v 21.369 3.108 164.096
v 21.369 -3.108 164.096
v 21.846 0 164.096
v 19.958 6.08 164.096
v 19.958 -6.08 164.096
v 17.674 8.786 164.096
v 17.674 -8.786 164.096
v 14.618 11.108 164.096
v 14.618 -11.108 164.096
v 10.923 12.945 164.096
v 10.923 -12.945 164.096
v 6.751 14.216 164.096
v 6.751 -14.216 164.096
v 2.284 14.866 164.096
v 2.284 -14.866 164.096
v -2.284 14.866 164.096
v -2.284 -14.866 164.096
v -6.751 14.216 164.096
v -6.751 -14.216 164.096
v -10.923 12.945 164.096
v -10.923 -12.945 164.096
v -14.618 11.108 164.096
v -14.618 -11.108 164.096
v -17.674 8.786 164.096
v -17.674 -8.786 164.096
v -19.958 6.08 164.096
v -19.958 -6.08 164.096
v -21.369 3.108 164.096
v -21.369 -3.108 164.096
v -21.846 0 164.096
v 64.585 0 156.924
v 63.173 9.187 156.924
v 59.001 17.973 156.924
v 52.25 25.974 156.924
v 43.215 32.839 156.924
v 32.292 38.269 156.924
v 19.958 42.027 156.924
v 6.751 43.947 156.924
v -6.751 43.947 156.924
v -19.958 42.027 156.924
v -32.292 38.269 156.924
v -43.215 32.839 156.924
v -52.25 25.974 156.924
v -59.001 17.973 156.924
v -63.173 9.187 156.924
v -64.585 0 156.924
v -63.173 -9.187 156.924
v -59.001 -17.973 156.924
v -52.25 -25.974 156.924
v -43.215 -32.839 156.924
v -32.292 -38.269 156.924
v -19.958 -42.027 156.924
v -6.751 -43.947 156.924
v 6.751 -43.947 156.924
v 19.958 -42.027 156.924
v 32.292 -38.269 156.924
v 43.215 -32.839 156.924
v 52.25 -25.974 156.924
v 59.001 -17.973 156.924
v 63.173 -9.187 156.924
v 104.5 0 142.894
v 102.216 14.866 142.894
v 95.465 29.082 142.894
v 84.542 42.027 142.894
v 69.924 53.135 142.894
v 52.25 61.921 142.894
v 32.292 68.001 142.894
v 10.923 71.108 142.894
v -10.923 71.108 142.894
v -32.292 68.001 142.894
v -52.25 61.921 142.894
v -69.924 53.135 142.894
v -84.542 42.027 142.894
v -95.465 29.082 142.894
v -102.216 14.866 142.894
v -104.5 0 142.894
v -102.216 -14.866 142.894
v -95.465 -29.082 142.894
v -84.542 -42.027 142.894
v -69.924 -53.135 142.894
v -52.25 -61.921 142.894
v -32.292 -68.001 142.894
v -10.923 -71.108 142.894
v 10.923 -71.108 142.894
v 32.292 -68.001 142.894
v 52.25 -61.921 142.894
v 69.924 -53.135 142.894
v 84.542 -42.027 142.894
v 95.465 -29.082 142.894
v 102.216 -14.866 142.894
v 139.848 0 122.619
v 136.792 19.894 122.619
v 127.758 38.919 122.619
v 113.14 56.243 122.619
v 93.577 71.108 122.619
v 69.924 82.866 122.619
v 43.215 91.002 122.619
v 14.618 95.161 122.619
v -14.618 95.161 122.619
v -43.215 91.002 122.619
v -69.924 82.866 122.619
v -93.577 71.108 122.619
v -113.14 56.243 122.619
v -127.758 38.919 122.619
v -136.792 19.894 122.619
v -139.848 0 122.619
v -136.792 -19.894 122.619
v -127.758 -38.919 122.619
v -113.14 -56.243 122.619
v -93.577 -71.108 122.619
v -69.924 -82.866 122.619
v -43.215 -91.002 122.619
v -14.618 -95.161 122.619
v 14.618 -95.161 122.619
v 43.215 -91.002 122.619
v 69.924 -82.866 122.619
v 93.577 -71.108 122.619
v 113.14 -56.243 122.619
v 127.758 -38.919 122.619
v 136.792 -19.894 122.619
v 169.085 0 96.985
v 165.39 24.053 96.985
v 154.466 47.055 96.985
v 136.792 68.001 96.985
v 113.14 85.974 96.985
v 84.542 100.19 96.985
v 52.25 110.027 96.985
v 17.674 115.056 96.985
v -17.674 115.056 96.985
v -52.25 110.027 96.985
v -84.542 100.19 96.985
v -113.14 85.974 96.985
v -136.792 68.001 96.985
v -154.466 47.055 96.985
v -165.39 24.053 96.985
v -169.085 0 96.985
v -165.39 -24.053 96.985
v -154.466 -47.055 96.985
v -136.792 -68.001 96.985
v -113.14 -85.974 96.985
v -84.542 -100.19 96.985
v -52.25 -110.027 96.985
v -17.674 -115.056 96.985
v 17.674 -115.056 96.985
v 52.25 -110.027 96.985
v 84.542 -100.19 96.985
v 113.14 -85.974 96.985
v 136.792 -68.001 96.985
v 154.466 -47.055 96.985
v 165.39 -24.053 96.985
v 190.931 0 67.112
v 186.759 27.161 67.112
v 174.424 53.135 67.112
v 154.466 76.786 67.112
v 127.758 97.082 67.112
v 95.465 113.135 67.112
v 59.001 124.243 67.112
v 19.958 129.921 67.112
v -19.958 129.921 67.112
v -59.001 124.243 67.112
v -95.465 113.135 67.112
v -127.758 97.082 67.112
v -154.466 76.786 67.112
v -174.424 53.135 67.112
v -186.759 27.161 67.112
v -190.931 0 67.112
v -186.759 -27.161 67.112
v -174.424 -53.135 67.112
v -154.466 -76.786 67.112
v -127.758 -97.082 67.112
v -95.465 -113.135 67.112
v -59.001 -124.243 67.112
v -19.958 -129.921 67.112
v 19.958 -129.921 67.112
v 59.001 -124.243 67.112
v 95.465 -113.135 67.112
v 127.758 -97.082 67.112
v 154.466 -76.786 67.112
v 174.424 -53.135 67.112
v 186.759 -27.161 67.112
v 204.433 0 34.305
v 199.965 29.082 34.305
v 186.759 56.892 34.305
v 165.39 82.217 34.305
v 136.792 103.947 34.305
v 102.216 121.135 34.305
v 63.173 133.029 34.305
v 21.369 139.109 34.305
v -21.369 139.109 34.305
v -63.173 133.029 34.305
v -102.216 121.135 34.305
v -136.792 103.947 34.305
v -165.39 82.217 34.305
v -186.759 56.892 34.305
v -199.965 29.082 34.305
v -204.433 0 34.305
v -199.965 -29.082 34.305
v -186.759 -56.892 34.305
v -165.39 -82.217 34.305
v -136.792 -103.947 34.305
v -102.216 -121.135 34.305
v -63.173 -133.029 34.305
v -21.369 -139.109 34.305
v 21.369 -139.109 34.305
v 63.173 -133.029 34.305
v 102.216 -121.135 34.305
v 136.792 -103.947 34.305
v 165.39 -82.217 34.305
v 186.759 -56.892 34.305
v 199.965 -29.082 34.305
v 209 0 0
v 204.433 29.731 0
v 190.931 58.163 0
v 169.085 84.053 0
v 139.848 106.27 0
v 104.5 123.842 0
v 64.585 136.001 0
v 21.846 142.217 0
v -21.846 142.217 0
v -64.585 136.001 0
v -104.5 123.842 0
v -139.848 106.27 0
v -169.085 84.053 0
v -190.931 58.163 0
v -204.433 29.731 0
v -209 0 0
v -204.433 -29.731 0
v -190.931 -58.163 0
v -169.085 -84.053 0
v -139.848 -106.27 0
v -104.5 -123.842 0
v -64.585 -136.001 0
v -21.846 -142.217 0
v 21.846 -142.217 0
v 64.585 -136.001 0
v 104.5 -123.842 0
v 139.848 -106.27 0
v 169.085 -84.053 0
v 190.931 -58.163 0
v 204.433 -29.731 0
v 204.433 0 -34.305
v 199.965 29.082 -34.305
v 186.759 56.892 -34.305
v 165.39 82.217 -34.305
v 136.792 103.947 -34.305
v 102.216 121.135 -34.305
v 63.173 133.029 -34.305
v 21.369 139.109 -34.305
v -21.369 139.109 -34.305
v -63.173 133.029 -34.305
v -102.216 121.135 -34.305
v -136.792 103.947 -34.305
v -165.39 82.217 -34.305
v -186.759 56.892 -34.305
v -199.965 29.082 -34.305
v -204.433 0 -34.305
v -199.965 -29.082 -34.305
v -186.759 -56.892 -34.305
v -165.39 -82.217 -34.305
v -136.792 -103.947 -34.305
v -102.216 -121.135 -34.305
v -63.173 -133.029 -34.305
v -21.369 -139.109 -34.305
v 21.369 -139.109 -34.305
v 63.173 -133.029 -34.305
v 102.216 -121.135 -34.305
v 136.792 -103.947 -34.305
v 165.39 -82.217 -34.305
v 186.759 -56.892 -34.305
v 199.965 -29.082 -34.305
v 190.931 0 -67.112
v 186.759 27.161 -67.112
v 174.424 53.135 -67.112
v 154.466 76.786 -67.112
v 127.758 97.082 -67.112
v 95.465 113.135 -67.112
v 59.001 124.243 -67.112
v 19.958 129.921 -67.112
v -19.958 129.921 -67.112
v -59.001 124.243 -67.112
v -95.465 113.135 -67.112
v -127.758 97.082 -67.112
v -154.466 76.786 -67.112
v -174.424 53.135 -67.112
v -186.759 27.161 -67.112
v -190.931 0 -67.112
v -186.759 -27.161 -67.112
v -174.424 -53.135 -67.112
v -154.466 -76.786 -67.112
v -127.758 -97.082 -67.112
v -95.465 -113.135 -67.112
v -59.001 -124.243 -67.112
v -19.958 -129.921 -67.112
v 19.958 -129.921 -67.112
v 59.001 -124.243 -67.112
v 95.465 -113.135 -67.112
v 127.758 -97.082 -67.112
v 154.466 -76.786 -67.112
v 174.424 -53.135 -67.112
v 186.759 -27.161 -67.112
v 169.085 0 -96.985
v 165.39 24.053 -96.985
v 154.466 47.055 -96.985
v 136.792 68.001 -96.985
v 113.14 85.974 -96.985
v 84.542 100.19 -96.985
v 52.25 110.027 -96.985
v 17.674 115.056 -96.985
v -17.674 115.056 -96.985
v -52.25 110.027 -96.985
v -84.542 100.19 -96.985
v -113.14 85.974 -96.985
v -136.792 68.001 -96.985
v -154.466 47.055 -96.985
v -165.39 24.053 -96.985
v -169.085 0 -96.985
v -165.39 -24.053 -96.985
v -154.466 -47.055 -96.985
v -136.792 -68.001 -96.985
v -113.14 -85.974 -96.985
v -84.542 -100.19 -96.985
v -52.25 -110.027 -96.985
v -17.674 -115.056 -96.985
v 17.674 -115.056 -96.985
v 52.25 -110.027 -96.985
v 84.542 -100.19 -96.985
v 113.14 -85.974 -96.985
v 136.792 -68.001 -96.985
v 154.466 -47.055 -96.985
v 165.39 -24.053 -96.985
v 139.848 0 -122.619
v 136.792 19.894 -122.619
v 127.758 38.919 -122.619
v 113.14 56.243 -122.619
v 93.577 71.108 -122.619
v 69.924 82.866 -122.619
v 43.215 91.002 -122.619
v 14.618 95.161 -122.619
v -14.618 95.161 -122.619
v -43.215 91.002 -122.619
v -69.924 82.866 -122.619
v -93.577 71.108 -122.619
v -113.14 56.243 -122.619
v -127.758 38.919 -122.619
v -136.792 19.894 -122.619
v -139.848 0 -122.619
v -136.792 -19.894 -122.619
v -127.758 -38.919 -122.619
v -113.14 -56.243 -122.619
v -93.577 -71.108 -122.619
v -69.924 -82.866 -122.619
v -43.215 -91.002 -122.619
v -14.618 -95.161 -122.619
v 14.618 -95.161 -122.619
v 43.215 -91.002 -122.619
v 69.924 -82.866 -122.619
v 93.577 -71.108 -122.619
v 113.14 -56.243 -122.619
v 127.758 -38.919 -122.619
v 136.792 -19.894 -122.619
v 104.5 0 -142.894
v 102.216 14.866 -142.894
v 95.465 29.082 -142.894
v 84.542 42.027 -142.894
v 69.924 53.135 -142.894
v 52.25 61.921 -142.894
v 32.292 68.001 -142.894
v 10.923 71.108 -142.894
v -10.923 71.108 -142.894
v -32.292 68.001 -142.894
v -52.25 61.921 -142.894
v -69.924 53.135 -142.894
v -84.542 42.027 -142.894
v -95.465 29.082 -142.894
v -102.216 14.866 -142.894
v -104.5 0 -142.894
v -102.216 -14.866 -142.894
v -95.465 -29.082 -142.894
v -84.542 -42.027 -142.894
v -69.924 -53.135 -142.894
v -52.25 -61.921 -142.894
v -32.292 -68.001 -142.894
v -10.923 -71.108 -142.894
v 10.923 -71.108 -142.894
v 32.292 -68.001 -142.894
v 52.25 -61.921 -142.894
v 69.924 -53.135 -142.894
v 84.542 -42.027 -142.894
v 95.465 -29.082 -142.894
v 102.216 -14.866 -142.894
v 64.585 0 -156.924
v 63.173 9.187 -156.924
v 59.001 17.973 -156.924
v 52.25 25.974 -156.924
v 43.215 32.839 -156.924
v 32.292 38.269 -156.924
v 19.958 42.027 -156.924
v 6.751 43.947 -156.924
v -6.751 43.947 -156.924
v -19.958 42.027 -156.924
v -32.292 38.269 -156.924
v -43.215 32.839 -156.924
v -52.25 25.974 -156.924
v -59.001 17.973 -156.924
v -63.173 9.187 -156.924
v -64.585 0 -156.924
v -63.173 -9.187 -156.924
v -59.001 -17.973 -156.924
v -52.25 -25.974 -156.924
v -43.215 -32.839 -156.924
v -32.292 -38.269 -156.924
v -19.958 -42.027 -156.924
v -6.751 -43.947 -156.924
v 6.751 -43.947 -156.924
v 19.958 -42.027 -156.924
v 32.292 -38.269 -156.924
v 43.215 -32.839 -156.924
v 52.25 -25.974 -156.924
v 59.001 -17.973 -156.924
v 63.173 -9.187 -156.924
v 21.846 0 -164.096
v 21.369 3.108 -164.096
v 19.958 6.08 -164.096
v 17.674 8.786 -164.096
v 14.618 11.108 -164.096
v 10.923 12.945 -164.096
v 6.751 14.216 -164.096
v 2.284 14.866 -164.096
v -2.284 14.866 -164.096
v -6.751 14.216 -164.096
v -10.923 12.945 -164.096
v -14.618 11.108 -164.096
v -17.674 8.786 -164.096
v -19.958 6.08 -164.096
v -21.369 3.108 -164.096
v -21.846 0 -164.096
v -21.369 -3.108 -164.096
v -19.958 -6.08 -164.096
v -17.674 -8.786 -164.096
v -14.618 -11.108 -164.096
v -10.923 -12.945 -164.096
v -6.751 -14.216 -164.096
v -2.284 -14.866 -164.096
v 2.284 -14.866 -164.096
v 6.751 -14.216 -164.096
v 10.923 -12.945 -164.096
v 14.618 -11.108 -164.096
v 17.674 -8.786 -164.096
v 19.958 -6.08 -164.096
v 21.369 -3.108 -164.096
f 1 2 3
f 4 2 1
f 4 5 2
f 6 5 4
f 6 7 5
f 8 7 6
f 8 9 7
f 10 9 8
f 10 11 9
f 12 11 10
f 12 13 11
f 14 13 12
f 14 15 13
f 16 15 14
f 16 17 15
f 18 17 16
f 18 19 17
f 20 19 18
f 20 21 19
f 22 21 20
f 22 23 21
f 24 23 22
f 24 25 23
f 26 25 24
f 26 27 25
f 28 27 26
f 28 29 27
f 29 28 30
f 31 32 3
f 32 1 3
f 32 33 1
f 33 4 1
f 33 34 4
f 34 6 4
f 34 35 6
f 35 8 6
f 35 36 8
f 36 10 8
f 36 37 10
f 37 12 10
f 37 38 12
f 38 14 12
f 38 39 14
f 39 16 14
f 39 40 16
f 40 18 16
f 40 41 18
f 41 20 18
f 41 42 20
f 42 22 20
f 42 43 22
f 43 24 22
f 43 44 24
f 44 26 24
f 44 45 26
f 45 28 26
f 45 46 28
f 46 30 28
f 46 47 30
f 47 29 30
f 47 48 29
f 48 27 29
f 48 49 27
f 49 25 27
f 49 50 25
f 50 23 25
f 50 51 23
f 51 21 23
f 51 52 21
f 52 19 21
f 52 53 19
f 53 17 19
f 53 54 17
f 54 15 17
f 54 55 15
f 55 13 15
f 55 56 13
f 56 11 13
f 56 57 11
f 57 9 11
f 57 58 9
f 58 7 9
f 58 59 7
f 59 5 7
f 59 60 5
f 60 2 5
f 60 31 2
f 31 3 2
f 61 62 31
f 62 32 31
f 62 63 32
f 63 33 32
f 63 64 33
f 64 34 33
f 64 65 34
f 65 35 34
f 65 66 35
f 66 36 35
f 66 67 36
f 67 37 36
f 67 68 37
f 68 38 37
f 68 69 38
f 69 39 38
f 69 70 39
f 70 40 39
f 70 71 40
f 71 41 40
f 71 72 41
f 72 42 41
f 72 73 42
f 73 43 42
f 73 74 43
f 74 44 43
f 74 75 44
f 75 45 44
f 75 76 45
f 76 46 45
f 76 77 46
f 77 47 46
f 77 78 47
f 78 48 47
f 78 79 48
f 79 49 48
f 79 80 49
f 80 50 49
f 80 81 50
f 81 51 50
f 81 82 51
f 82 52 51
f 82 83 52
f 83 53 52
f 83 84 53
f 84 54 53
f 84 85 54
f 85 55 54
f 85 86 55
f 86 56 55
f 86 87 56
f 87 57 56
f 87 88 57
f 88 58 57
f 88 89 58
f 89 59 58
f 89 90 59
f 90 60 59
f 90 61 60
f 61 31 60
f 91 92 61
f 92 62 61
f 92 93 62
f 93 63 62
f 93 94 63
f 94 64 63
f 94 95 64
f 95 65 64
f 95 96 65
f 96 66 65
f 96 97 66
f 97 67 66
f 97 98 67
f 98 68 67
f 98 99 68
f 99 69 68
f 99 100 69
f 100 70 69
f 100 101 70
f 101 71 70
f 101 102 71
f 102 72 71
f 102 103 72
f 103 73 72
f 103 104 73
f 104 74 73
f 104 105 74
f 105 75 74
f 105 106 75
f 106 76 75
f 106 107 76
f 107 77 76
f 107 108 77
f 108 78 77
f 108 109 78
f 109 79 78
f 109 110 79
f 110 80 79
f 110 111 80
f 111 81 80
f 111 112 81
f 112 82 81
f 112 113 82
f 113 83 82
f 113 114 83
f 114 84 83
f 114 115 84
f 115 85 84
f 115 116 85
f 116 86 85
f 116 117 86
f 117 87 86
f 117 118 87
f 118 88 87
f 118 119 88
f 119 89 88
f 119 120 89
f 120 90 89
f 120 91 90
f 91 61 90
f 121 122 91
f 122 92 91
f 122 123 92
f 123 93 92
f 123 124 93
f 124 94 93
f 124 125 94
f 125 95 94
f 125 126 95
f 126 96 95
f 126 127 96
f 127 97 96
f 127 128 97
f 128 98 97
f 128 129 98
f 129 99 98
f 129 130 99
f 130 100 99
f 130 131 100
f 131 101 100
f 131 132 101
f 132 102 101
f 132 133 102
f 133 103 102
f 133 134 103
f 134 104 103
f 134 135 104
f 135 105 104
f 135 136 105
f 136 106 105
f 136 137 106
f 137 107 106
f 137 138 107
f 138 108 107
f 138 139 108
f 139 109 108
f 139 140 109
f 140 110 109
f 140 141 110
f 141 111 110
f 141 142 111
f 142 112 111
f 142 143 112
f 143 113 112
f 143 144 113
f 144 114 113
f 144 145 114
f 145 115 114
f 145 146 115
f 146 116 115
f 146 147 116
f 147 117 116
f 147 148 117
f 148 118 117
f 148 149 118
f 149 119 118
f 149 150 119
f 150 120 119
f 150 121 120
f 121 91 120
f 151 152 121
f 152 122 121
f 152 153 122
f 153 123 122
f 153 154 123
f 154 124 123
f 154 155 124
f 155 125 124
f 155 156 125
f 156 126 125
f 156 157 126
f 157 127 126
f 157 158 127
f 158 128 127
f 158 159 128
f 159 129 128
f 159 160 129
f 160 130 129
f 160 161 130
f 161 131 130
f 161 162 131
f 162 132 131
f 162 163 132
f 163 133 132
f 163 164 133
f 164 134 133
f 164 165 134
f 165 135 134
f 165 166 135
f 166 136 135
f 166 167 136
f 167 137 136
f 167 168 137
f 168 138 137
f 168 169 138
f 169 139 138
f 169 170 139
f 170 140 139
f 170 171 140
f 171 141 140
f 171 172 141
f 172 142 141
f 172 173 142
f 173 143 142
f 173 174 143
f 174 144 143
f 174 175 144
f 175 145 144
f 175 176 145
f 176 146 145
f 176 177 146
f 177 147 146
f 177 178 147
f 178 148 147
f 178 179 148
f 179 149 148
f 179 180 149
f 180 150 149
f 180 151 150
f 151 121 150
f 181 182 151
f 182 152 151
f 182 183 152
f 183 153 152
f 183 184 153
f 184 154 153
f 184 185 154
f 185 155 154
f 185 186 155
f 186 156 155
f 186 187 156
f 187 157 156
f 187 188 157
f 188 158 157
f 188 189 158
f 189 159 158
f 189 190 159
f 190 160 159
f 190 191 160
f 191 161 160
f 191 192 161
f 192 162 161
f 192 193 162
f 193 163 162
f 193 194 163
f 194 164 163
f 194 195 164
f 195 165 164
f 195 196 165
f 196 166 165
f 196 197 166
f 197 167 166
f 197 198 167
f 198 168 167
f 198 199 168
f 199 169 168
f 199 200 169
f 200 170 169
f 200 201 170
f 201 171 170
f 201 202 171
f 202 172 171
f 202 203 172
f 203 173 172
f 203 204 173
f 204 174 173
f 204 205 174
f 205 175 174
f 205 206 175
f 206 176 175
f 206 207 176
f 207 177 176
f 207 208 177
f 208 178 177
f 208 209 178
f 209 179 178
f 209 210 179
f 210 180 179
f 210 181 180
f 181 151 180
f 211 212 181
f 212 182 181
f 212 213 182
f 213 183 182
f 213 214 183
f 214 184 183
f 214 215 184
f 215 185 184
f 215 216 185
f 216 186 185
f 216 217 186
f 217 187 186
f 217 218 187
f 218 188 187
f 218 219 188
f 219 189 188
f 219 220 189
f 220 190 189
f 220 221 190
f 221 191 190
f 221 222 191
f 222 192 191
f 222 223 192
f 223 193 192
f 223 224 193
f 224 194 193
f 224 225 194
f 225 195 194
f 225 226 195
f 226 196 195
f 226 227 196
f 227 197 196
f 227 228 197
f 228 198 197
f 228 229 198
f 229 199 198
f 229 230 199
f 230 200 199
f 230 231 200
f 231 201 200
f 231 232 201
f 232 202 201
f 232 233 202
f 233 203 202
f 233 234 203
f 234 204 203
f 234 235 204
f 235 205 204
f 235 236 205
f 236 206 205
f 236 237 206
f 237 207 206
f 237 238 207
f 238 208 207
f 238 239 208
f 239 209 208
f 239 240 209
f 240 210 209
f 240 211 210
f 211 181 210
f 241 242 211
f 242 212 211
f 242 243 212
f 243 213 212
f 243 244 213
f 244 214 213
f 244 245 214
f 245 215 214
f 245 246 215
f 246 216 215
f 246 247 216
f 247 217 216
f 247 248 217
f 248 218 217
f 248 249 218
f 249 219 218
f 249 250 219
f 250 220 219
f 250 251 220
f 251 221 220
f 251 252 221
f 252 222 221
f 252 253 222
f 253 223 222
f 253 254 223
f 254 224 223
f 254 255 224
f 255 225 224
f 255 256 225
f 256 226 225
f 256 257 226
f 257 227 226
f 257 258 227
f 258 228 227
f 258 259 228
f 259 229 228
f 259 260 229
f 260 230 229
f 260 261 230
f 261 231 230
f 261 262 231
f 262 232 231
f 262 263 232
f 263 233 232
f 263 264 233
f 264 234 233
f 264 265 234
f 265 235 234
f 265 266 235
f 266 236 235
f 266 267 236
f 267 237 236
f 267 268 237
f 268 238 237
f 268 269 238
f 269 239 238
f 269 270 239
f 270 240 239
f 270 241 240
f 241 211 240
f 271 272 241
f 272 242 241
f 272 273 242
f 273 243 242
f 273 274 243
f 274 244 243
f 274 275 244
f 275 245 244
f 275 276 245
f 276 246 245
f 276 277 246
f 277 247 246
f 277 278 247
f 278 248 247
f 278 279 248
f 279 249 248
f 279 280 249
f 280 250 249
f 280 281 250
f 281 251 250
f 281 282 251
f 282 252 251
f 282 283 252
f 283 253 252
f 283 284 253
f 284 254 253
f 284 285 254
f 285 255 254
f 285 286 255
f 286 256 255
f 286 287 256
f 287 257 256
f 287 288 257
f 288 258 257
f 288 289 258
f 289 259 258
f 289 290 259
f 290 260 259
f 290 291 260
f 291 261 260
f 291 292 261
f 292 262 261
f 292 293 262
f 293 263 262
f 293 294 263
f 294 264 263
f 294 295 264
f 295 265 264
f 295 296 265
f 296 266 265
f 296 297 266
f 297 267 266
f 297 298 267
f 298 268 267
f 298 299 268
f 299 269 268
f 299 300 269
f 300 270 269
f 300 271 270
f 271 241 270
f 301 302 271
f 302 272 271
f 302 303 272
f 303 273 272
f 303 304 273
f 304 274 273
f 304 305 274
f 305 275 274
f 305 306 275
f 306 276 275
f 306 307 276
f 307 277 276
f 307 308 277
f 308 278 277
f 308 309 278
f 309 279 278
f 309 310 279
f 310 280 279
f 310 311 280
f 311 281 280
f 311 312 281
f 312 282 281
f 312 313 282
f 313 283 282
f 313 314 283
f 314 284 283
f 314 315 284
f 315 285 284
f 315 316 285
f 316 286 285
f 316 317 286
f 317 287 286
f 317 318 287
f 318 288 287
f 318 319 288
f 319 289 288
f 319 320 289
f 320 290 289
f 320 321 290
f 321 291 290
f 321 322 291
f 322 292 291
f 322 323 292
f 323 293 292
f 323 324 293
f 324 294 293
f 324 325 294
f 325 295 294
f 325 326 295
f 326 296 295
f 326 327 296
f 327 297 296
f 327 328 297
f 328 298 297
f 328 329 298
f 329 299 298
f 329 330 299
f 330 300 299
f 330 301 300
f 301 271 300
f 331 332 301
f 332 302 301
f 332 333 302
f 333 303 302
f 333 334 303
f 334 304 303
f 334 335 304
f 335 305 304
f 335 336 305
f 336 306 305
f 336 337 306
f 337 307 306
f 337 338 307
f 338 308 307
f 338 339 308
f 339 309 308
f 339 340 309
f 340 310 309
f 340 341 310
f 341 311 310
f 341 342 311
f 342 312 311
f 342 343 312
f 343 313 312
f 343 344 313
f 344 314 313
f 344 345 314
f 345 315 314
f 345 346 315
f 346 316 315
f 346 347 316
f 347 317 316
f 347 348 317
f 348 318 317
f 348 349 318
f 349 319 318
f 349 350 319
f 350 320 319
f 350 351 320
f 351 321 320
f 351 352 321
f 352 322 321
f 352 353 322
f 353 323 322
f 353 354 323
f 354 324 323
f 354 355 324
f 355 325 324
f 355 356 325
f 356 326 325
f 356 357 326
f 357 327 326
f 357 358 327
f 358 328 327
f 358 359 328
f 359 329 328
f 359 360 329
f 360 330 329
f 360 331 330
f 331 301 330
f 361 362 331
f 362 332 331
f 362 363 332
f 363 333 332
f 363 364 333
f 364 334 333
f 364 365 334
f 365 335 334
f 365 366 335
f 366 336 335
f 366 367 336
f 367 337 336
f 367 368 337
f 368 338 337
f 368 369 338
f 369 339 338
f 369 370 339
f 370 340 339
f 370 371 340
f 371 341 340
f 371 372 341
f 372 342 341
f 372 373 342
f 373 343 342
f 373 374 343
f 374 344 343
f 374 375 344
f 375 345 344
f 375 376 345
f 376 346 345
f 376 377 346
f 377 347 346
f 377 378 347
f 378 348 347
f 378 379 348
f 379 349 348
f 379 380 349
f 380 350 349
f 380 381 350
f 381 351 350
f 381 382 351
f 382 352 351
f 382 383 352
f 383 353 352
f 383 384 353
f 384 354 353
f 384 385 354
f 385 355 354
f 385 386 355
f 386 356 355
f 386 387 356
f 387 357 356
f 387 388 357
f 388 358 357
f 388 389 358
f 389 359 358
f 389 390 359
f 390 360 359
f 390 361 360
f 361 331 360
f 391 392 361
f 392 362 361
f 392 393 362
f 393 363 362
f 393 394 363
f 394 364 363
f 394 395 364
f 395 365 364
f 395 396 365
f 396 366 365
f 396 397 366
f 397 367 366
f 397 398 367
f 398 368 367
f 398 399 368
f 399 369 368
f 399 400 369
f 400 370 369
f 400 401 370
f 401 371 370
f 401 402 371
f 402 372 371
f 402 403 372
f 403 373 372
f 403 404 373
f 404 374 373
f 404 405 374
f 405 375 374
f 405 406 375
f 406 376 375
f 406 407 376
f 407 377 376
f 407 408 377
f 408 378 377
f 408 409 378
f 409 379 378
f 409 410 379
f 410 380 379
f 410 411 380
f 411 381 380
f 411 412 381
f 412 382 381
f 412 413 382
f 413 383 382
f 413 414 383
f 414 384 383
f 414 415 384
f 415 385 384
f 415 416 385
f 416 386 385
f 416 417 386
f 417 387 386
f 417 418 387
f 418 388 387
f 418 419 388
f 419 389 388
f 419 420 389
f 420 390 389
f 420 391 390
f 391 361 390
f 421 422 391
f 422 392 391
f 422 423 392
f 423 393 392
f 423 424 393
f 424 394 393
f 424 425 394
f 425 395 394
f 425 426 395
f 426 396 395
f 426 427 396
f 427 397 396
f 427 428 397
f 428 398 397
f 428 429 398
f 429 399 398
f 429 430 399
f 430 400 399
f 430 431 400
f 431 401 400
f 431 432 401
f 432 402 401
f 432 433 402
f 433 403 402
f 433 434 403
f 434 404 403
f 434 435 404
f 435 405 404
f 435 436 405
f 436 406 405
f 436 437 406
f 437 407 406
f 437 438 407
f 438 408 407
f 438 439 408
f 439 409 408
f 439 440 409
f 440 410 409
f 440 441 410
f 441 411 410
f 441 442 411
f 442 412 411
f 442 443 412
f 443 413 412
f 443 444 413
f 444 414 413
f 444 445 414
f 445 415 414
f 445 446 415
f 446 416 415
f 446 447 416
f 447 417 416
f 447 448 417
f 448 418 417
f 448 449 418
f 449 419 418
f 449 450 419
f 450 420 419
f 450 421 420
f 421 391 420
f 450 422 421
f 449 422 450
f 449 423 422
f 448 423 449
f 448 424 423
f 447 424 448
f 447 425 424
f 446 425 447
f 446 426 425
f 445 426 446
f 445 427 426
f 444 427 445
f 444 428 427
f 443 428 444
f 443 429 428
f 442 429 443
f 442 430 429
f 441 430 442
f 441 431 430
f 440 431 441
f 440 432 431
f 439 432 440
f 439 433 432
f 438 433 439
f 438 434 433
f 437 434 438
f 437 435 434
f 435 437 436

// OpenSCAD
// Generated by SolidPython 1.0.1 on 2020-07-29 00:46:54


scale(v = [19, 13, 15]) {
	sphere(r = 11);
}
/***********************************************
*********      SolidPython code:      **********
************************************************
 
# import packages: SolidPython
from solid import *
from solid.utils import *
from itertools import chain, combinations, permutations


class Resize:

    def __init__(self, scad_file):
        self.scad_file = scad_file
        #self.scad_file = import_scad(scad_file)
        # cone/cylinder param:
        self.r1 = 0
        self.r2 = 0
        self.h = 0
        # rectangular prism param:
        self.w = 0
        self.l = 0
        # ellipse param:
        self.r = 0

    # import OpenScad code (file name corresponds to shape)


    # classify shape + parameters
    def assign(self, param1, param2, param3):
        if self.scad_file == 'cone.scad':
            self.r1 = param1
            self.r2 = param2
            self.h = param3
        elif self.scad_file == 'cylinder.scad':
            self.r1 = param1
            self.r2 = param2
            self.h = param3
        elif self.scad_file == 'rectangularPrism.scad':
            self.h = param1
            self.l = param2
            self.w = param3
        else:
            self.r = param1
            self.h = param2

    # resize parameters
    def iterate(self):
        x = range(3, 20, 2)
        i = 1
        if self.scad_file == 'cone.scad':
            tempList = list(permutations(x, 2))
            for temp in tempList:
                param1 = temp[0]
                param2 = temp[1]
                filepath = 'produced_scad_files/' + 'cone' + str(param1) + '_' + str(param2) + '_' + '.scad'
                scad_render_to_file(cylinder(h=param1, r1=param2, r2=0), filepath)

        elif self.scad_file == 'cylinder.scad':
            tempList = list(permutations(x, 3))
            for temp in tempList:
                param1 = temp[0]
                param2 = temp[1]
                filepath = 'produced_scad_files/' + 'cylinder' + str(param1) + '_' + str(param2) + '_' + '.scad'
                scad_render_to_file(cylinder(h=param1, r1=param2, r2=param2), filepath)

        elif self.scad_file == 'rectangularPrism.scad':
            tempList = list(permutations(x, 3))
            for temp in tempList:
                param1 = temp[0]
                param2 = temp[1]
                param3 = temp[2]
                filepath = 'produced_scad_files/' + 'rectangularPrism' + str(param1) + '_' + str(param2) + '_' + str(
                    param3) + '.scad'
                scad_render_to_file(cube(size=(param1, param2, param3)), filepath)

        elif self.scad_file == 'ellipse.scad':
            tempList = list(permutations(x, 4))
            for temp in tempList:
                param1 = temp[0]
                param2 = temp[1]
                param3 = temp[2]
                param4 = temp[3]
                filepath = 'produced_scad_files/' + 'ellipse' + str(param1) + '_' + str(param2) + '_' + str(param3) + '_' + str(param4) + '.scad'
                scad_render_to_file(scale([param1, param2, param3])(sphere(r=param4)), filepath)

    def render_to_scadfile(self):
        scad_render_to_file(scad, 'example.scad') 
 
************************************************/
